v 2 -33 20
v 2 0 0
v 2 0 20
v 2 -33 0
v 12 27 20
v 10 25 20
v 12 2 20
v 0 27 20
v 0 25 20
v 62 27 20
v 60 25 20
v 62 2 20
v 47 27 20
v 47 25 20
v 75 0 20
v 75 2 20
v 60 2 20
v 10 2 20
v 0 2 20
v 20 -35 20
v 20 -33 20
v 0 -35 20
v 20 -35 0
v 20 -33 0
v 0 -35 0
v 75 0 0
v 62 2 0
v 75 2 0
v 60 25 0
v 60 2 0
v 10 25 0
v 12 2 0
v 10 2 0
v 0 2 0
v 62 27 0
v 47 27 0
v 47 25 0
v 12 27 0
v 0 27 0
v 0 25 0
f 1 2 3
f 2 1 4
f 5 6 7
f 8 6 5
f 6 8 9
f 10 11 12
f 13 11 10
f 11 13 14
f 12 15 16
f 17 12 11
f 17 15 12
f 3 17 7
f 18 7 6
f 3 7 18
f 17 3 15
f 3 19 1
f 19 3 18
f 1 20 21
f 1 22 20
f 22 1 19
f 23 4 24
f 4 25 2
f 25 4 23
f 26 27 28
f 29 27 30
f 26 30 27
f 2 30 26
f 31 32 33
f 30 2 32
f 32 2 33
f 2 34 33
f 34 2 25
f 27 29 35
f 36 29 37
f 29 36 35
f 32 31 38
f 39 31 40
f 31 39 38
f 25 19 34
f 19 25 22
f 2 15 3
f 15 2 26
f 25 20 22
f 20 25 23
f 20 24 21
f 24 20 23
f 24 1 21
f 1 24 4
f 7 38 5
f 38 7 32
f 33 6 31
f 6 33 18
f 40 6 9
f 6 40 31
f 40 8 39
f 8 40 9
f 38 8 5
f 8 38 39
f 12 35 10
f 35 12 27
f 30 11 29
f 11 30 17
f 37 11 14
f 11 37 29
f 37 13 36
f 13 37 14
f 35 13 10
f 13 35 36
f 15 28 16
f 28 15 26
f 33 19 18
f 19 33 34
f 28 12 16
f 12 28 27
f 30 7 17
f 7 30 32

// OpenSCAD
wall = 2;
height = 20;

complete();

module complete()
{
	translate([0, -35, 0]) {
		monitor_hook(wall, height);
	}

	main_beam(wall, height);

	translate([10, 0, 0]) {
		top_L(wall, height);
	}

	translate([60, 0, 0]) {
		bottom_L(wall, height);
	}

}

module main_beam(wall, height)
{
	cube([75, wall, height]);
}

module monitor_hook(wall, height)
{
	cube([wall, 35, height]);
	cube([20, wall, height]);
}

module top_L(wall, height)
{
	cube([wall, 25, height]);
	translate([-10, 25, 0]) {
		cube([10 + wall, wall, height]);
	}
}

module bottom_L(wall, height)
{
	cube([wall, 25, height]);
	translate([-15 + wall, 25, 0]) {
		cube([15, wall, height]);
	}
}
